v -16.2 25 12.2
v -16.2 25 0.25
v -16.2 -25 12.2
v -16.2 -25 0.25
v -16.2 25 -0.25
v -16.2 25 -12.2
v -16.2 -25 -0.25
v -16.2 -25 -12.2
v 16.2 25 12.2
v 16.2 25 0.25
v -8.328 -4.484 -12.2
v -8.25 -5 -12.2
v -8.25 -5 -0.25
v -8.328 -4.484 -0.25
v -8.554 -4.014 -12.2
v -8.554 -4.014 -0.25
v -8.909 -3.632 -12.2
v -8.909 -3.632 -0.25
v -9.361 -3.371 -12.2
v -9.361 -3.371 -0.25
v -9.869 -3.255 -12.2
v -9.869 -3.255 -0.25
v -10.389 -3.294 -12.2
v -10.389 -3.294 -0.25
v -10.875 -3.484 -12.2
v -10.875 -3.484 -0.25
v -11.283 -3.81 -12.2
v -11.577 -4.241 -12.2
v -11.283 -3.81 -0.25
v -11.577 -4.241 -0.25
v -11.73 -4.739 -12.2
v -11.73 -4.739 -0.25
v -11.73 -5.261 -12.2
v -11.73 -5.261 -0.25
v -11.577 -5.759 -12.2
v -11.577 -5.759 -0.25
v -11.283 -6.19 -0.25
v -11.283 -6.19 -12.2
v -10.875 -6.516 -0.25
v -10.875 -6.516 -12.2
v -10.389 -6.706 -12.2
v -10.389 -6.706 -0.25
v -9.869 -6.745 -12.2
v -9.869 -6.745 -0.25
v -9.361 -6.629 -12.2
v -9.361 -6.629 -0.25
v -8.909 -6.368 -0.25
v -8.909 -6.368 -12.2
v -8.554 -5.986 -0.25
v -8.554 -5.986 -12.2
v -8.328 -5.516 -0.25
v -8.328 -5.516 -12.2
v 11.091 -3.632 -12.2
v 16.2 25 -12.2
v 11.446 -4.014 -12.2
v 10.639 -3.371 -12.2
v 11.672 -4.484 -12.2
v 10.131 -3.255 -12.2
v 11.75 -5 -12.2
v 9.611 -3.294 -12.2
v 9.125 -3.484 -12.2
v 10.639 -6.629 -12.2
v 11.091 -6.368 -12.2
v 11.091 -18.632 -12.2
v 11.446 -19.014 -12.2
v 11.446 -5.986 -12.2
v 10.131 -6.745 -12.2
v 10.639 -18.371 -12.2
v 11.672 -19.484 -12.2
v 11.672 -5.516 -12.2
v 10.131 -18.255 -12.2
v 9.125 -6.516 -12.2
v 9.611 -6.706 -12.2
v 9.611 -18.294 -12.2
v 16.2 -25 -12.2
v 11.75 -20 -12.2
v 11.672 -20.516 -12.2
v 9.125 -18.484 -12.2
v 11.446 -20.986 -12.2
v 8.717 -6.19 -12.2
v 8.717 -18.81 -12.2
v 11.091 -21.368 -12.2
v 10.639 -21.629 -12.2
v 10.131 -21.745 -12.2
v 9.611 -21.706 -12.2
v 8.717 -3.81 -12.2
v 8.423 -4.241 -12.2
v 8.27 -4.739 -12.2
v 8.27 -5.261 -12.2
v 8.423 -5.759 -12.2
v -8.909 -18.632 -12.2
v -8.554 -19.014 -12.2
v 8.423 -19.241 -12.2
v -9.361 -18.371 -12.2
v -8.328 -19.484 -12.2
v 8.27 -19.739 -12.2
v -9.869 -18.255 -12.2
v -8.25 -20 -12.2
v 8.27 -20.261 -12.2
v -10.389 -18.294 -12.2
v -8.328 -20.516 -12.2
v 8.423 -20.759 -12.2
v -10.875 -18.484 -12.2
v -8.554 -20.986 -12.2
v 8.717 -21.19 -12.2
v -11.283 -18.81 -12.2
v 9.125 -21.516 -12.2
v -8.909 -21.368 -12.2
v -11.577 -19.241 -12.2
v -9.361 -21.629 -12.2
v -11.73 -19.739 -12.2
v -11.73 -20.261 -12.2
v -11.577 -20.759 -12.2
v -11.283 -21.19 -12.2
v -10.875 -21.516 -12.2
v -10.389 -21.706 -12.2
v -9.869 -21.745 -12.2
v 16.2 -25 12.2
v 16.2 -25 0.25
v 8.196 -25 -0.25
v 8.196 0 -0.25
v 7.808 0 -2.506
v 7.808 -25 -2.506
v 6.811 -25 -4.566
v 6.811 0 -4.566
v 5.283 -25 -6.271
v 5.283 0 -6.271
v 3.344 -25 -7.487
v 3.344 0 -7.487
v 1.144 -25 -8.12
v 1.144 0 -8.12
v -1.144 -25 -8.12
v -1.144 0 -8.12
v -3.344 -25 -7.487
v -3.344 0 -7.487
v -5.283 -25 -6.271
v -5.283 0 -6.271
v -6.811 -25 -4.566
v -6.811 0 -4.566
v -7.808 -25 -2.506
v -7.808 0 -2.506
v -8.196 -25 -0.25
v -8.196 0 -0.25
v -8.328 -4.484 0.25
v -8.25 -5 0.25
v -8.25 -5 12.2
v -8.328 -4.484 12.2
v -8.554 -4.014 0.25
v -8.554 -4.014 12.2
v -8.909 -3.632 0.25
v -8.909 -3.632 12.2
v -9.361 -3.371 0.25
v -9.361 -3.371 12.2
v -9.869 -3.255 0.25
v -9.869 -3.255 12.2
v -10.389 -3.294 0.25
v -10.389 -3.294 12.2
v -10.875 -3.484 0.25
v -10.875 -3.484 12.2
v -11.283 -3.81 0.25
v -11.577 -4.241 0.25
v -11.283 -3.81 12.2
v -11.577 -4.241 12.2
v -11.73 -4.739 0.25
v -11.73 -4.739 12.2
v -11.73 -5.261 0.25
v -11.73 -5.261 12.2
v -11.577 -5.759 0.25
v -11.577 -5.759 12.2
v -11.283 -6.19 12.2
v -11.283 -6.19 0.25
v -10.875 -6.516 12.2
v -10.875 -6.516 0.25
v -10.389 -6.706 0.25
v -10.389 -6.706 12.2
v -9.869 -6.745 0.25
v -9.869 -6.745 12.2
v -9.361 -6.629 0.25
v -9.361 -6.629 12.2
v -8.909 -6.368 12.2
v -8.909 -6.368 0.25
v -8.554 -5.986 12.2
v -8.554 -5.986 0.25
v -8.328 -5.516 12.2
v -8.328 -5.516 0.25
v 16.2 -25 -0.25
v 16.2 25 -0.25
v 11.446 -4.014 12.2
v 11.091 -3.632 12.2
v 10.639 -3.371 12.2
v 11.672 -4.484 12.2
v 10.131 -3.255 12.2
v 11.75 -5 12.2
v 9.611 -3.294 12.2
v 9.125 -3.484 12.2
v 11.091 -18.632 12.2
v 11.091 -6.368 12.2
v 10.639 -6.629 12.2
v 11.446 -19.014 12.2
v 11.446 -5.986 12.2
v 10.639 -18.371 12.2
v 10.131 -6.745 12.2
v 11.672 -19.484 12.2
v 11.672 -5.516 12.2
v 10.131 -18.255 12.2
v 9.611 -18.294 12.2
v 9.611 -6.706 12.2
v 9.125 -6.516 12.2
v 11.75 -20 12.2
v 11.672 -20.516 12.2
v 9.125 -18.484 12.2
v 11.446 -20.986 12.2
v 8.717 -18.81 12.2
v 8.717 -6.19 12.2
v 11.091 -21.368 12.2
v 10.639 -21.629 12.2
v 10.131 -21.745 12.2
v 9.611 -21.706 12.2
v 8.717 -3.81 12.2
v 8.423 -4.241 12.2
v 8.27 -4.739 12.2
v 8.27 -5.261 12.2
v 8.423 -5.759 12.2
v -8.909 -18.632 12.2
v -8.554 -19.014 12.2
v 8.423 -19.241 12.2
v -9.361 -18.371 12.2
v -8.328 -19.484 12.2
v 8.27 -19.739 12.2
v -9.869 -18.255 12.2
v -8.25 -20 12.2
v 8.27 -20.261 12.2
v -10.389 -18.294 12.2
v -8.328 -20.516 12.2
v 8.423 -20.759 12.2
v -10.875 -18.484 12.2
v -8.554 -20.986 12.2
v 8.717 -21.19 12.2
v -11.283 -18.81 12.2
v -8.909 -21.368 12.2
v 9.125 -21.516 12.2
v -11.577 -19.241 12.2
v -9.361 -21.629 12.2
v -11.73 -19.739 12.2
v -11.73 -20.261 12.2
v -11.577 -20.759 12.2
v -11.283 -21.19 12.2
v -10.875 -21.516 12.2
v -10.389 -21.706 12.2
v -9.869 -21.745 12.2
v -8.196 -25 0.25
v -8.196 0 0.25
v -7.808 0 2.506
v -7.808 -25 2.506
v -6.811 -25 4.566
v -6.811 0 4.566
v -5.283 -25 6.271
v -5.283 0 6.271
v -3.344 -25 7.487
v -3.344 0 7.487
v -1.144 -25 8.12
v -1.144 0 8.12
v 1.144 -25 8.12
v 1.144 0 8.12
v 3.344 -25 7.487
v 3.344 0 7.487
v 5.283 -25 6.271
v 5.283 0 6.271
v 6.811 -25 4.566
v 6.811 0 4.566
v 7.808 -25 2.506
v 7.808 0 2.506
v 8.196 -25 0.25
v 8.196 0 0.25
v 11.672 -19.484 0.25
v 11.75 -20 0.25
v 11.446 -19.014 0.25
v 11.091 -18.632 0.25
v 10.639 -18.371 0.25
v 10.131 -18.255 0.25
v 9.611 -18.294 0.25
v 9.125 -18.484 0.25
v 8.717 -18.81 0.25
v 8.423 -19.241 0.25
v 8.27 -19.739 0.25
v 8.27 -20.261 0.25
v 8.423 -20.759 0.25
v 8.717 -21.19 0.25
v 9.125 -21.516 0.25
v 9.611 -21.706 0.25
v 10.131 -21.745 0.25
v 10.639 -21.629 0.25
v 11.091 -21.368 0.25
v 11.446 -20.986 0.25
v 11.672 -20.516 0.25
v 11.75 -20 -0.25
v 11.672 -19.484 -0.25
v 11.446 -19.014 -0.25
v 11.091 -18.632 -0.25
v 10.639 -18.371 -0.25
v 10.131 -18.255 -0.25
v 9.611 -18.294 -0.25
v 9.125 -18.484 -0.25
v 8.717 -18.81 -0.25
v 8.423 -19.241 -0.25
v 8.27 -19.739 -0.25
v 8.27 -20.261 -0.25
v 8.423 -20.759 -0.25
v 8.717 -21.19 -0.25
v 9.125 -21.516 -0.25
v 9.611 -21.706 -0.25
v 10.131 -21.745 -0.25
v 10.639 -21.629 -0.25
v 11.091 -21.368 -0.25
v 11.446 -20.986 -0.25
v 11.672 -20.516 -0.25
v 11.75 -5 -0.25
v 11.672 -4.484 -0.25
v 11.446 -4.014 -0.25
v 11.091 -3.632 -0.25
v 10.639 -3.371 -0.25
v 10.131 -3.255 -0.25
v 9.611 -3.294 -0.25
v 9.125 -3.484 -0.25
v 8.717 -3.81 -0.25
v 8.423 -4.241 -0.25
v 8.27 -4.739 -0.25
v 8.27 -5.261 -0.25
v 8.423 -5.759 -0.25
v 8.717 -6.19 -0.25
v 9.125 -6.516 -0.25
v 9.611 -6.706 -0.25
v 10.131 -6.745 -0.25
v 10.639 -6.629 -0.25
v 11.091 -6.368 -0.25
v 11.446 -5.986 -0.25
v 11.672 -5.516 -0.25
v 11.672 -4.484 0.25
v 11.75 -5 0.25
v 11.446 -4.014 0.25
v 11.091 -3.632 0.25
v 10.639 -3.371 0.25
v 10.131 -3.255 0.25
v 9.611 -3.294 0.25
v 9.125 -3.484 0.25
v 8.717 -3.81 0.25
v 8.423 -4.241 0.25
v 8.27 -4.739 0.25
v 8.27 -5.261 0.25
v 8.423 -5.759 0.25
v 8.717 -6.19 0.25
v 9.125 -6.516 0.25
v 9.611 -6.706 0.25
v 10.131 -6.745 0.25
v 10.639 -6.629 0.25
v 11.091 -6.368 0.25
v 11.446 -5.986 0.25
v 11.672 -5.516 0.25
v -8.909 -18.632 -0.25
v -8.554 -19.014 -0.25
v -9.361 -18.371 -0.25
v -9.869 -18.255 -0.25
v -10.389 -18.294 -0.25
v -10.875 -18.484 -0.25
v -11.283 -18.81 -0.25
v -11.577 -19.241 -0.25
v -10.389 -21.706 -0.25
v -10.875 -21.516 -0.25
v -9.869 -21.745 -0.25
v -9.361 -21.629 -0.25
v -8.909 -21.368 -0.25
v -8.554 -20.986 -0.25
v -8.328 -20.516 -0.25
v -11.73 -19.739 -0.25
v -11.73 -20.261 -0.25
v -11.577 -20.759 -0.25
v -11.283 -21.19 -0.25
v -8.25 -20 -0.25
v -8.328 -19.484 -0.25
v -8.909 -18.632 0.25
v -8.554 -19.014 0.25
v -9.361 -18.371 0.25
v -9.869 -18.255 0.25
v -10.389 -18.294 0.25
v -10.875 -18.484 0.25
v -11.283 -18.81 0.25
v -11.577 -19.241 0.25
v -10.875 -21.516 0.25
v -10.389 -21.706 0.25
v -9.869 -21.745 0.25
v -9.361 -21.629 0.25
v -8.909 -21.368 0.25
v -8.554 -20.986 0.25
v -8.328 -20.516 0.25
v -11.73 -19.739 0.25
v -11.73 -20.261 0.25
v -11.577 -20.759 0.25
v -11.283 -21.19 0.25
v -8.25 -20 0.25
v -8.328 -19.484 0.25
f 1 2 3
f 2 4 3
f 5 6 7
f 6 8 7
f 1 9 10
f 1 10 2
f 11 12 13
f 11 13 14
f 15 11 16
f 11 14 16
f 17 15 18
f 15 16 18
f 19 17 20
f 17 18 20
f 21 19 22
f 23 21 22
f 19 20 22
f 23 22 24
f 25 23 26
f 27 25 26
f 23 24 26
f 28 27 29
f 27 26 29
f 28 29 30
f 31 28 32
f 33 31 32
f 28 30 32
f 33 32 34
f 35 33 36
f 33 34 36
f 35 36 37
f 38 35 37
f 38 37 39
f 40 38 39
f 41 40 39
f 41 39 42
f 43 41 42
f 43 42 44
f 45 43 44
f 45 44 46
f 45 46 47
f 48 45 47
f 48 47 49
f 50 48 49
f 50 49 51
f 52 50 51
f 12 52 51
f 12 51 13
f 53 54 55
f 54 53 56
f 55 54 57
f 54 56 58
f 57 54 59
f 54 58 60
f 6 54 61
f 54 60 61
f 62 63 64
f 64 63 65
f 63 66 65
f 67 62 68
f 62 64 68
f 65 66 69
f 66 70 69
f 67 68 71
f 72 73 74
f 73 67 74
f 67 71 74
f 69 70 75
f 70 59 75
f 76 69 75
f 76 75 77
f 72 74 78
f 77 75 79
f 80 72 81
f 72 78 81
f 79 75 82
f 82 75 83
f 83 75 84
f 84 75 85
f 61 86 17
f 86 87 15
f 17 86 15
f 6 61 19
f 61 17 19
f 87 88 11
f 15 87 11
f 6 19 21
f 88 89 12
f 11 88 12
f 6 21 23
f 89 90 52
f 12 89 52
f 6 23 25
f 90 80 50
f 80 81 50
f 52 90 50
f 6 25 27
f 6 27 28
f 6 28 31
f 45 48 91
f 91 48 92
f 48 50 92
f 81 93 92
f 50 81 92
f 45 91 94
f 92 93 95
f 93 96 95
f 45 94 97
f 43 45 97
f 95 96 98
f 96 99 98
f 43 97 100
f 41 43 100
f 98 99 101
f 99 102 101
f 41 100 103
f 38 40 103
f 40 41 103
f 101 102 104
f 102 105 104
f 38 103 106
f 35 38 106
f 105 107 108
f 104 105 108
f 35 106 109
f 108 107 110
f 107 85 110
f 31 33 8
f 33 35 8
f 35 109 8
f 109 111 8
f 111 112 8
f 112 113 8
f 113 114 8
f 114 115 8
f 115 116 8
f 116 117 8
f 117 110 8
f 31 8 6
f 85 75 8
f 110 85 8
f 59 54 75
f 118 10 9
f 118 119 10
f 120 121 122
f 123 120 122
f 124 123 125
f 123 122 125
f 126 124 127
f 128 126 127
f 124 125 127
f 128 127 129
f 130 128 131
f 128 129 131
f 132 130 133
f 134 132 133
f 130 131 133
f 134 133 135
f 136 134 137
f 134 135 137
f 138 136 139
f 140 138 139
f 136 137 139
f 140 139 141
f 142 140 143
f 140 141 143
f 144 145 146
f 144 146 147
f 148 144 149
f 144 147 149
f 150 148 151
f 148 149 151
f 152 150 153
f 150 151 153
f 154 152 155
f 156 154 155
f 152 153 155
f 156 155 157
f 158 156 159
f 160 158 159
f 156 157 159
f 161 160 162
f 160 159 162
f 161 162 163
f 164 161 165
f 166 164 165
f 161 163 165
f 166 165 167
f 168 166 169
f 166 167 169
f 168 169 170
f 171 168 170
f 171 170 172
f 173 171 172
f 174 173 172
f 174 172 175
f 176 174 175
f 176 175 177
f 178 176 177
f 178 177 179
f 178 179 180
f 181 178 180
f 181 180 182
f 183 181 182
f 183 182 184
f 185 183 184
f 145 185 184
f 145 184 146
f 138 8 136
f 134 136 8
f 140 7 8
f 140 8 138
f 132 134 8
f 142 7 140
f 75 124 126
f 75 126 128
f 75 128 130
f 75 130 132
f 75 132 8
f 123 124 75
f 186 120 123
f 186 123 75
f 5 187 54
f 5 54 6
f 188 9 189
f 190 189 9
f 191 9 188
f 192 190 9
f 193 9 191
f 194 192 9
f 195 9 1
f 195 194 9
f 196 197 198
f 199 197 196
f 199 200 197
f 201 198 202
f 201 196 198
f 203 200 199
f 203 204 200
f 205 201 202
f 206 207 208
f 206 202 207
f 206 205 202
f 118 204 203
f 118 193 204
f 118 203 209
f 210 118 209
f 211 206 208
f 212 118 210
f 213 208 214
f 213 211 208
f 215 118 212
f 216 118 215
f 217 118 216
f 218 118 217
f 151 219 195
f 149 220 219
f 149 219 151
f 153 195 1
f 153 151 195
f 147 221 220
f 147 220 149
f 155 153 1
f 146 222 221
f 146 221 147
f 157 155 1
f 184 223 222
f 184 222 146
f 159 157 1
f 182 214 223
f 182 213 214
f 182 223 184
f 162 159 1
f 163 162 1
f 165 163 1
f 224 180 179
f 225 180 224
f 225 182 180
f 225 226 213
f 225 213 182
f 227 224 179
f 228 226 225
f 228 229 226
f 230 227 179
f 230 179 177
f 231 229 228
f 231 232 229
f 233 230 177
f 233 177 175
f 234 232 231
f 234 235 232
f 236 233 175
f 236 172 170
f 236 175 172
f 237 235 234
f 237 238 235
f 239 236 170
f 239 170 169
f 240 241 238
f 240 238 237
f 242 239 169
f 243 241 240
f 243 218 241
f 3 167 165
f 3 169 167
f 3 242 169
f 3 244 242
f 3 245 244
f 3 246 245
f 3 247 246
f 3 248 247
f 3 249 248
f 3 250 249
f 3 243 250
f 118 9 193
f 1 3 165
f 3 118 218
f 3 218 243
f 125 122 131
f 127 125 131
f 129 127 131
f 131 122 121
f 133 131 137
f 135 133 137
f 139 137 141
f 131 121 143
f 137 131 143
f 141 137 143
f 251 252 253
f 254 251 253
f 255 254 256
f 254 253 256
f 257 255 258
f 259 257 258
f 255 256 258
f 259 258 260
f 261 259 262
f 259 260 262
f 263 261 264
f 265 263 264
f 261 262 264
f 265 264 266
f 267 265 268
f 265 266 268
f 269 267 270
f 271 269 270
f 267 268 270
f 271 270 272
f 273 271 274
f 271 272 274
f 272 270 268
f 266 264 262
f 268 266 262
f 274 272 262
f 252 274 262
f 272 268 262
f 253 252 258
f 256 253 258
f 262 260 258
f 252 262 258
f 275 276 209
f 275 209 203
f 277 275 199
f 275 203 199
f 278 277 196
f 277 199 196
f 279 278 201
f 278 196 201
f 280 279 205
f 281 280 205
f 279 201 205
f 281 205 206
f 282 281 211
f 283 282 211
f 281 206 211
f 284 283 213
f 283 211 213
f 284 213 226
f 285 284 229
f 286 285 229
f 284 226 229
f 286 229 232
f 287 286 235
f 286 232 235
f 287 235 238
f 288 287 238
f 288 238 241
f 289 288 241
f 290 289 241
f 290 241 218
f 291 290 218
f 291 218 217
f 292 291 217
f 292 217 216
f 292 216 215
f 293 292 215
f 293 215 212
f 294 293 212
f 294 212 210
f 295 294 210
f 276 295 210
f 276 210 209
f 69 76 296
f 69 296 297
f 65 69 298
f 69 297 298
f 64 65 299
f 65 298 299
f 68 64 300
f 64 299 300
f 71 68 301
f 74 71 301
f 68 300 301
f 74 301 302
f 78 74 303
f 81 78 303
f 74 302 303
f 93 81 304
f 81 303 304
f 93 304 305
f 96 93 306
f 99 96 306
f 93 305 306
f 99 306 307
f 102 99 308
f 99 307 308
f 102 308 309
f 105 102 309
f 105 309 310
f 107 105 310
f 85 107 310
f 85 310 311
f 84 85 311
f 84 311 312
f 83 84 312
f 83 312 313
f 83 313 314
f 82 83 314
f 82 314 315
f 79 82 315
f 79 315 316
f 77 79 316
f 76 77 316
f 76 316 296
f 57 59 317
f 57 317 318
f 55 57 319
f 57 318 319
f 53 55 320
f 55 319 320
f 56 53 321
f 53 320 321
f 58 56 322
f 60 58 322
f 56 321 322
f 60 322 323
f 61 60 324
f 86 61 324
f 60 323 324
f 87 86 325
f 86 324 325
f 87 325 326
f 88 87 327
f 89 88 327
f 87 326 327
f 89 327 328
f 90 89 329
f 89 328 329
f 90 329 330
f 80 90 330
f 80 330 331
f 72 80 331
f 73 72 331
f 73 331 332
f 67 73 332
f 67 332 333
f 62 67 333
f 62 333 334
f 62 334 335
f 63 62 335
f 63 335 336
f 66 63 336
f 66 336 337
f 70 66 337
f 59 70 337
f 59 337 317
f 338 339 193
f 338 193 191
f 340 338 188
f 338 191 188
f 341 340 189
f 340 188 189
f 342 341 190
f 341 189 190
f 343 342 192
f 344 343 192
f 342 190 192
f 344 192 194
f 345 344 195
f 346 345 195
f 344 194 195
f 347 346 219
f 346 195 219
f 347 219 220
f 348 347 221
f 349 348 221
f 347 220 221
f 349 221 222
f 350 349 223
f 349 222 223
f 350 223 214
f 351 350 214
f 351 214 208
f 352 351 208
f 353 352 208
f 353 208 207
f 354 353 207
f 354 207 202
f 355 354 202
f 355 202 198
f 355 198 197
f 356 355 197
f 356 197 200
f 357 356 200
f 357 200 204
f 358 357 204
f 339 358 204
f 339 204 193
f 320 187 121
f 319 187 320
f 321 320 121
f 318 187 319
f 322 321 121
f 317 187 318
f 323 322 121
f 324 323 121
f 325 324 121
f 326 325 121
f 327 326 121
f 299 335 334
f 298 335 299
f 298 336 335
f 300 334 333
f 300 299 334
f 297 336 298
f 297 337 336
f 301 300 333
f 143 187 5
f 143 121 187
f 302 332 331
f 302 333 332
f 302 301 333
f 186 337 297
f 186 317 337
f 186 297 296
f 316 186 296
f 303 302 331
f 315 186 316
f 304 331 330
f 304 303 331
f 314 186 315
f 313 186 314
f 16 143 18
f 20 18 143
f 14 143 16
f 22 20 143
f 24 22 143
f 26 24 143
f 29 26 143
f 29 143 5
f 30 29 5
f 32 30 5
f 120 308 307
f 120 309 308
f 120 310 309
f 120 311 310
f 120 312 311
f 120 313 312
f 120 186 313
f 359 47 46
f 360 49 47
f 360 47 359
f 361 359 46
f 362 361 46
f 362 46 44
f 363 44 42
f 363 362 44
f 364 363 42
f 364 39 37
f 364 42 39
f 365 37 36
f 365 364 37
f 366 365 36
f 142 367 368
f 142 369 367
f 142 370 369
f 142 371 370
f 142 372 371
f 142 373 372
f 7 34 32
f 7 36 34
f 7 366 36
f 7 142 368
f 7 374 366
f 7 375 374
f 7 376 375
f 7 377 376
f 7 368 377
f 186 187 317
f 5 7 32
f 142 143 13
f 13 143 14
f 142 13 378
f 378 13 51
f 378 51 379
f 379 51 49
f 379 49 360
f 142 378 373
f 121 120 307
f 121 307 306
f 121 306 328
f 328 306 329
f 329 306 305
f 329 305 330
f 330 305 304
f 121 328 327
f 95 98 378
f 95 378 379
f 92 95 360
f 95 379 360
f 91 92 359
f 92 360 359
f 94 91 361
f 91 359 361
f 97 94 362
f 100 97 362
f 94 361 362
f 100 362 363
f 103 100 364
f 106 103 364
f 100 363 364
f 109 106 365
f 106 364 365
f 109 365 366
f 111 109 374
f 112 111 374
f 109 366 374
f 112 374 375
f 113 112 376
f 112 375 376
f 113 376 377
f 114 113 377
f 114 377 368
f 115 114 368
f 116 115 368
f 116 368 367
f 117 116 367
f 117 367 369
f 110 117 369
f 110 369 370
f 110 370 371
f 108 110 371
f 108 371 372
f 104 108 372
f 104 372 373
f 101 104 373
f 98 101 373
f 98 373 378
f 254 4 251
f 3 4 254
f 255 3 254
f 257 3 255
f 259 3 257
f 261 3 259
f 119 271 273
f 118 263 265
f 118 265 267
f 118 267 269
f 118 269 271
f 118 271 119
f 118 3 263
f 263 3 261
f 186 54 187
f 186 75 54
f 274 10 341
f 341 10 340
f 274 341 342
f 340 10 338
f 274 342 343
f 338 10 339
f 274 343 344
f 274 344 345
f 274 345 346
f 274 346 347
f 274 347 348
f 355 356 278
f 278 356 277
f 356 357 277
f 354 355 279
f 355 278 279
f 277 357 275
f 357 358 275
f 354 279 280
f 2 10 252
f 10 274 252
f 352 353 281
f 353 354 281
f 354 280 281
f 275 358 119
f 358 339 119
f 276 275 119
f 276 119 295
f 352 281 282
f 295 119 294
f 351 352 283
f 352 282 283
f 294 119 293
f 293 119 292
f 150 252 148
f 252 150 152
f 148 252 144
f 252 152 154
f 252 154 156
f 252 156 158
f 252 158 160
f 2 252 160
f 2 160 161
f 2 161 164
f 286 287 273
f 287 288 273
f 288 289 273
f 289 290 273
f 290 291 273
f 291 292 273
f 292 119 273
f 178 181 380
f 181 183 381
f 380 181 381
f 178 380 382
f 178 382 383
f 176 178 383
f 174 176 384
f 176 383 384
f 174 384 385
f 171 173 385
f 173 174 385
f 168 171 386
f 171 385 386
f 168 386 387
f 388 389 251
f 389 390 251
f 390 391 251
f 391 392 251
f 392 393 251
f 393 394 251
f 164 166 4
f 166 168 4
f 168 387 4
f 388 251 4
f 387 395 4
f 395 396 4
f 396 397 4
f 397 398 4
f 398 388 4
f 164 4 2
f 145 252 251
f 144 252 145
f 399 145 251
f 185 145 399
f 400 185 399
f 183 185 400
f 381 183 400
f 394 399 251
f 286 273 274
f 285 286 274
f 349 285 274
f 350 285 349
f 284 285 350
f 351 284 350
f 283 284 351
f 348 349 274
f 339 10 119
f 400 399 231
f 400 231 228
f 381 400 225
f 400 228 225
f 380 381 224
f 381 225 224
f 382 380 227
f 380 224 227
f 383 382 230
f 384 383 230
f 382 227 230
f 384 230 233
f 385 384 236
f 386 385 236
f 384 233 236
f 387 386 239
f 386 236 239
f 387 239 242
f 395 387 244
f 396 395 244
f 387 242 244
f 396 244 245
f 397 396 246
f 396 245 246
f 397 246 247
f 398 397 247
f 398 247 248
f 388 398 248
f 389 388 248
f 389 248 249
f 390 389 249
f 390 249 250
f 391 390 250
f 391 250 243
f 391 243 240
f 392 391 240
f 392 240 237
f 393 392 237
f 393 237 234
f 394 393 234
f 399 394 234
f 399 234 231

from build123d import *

# Parameters (mm, degrees)
F1_DEPTH = 25
F2_W     = 32.4
F2_H     = 11.95
F3_DEPTH = 25
F4_W     = 32.4
F4_H     = 11.95
F5_DEPTH = 25
F6_R     = 1.75
F7_DEPTH = 24.4


with BuildPart() as f1:
    # F0 (on Front) → F1 (new body)
    with BuildSketch(Plane.XZ):
        with BuildLine():
            ThreePointArc((8.196188, -0.25), (0, -8.2), (-8.196188, -0.25))
            Line((-8.196188, -0.25), (-16.2, -0.25))
            Line((-16.2, -0.25), (-16.2, -12.2))
            Line((-16.2, -12.2), (16.2, -12.2))
            Line((16.2, -12.2), (16.2, -0.25))
            Line((16.2, -0.25), (8.196188, -0.25))
        make_face()
        with BuildLine():
            Line((16.2, 0.25), (16.2, 12.2))
            Line((16.2, 12.2), (-16.2, 12.2))
            Line((-16.2, 12.2), (-16.2, 0.25))
            Line((-16.2, 0.25), (-8.196188, 0.25))
            ThreePointArc((-8.196188, 0.25), (0, 8.2), (8.196188, 0.25))
            Line((8.196188, 0.25), (16.2, 0.25))
        make_face()
    extrude(amount=F1_DEPTH)

    # F2 (on face) → F3 (join)
    with BuildSketch(Plane(origin=(0, 0, 0), x_dir=(-1, 0, 0), z_dir=(0, 1, 0))):
        with Locations((0, 6.225)):
            Rectangle(F2_W, F2_H)
    extrude(amount=F3_DEPTH)

    # F4 (on face) → F5 (join)
    with BuildSketch(Plane(origin=(0, 0, 0), x_dir=(-1, 0, 0), z_dir=(0, 1, 0))):
        with Locations((0, -6.225)):
            Rectangle(F4_W, F4_H)
    extrude(amount=F5_DEPTH)

    # F6 (on face) → F7 (cut, through all)
    with BuildSketch(Plane.XY.offset(12.2)):
        with Locations((10, -5)):
            Circle(F6_R)
        with Locations((-10, -5)):
            Circle(F6_R)
        with Locations((-10, -20)):
            Circle(F6_R)
        with Locations((10, -20)):
            Circle(F6_R)
    extrude(amount=-F7_DEPTH, mode=Mode.SUBTRACT)


solid = f1.part
